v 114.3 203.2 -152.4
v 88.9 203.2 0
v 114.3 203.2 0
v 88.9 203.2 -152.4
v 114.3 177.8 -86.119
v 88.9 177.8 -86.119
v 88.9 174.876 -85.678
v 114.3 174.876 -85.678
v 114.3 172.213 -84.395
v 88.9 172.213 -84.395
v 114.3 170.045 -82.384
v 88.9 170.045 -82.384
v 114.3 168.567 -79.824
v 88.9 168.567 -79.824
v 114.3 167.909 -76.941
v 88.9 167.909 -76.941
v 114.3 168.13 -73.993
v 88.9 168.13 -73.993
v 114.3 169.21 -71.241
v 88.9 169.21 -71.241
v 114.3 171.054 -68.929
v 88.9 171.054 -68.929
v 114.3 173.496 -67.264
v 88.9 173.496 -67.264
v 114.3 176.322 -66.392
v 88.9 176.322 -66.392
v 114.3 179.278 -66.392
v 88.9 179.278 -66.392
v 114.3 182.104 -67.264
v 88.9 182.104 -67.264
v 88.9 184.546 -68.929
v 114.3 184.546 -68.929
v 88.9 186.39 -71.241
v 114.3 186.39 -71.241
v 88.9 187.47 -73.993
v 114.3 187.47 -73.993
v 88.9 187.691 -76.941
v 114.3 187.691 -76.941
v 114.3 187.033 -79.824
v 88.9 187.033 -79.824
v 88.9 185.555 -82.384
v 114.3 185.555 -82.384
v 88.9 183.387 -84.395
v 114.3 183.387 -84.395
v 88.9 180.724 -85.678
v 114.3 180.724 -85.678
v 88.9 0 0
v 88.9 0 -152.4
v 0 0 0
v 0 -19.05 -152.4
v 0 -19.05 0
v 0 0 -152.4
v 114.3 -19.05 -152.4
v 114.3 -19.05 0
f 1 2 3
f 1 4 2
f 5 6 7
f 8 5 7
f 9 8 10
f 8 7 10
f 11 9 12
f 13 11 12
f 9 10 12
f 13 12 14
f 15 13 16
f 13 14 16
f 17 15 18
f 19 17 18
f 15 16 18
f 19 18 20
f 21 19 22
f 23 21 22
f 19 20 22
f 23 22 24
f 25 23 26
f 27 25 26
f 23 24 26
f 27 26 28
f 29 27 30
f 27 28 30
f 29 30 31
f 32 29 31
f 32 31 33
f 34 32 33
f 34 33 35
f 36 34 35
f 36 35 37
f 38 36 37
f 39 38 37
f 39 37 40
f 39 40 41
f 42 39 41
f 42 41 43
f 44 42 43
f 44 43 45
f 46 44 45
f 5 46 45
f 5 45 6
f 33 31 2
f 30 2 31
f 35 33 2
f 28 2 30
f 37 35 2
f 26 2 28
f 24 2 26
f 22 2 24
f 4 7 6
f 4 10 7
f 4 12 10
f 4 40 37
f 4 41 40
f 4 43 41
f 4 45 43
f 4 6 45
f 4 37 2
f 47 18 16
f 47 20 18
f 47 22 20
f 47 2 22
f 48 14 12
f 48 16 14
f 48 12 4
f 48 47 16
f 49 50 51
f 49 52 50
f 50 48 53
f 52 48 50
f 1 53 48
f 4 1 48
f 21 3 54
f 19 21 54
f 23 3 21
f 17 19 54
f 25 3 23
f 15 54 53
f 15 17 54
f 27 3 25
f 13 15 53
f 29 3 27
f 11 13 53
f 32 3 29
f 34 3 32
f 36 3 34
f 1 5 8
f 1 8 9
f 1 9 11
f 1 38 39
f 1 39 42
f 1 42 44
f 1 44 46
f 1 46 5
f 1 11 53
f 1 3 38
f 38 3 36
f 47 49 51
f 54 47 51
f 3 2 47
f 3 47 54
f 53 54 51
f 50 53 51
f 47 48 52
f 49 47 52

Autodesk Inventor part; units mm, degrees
ref_plane "YZ Plane" through (0, 0, 0) normal (1, 0, 0) x (0, 1, 0)
ref_plane "XZ Plane" through (0, 0, 0) normal (0, 1, 0) x (-1, 0, 0)
ref_plane "XY Plane" through (0, 0, 0) normal (0, 0, 1) x (1, 0, 0)
sketch "Sketch2" plane through (0, 0, 0) normal (0, 1, 0) x (-1, 0, 0)
  line L0 (0, 0) -> (-114.3, 0)
  line L1 (-114.3, 0) -> (-114.3, -152.4)
  line L2 (-114.3, -152.4) -> (0, -152.4)
  line L3 (0, -152.4) -> (0, 0)
  dimension "d1" = 152.4
  dimension "d2" = 114.3
extrude "Extrusion1" add sketch "Sketch2" against normal blind 19.05
sketch "Sketch3" plane through (0, 0, 0) normal (0, 1, 0) x (1, 0, 0)
  line L0 (114.3, 0) -> (114.3, 152.4) projected
  line L1 (114.3, 152.4) -> (0, 152.4) projected
  line L2 (0, 0) -> (114.3, 0) projected
  line L3 (114.3, 152.4) -> (114.3, 0) projected
  line L4 (0, 152.4) -> (114.3, 152.4) projected
  line L5 (114.3, 0) -> (88.9, 0)
  line L6 (88.9, 0) -> (88.9, 152.4)
  line L7 (88.9, 152.4) -> (114.3, 152.4)
  line L8 (114.3, 152.4) -> (114.3, 0)
  point P0 (88.9, 0)
  dimension "d5" = 25.4
extrude "Extrusion2" add sketch "Sketch3" along normal blind 203.2
sketch "Sketch4" plane through (114.3, -19.05, 0) normal (1, 0, 0) x (0, 0, -1)
  line L0 (0, 222.25) -> (152.4, 222.25) construction
  line L1 (76.2, 222.25) -> (76.2, 0) construction
  line L2 (152.4, 0) -> (0, 0) construction
  point P0 (0, 19.05)
  point P1 (76.2, 196.85)
  dimension "d8" = 25.4
hole "Hole1" at (114.3, 177.8, -76.2) direction (-1, 0, 0) diameter 19.8374 end through all
properties part number "oneHalfForkSupport" material "Wood (Birch)"
